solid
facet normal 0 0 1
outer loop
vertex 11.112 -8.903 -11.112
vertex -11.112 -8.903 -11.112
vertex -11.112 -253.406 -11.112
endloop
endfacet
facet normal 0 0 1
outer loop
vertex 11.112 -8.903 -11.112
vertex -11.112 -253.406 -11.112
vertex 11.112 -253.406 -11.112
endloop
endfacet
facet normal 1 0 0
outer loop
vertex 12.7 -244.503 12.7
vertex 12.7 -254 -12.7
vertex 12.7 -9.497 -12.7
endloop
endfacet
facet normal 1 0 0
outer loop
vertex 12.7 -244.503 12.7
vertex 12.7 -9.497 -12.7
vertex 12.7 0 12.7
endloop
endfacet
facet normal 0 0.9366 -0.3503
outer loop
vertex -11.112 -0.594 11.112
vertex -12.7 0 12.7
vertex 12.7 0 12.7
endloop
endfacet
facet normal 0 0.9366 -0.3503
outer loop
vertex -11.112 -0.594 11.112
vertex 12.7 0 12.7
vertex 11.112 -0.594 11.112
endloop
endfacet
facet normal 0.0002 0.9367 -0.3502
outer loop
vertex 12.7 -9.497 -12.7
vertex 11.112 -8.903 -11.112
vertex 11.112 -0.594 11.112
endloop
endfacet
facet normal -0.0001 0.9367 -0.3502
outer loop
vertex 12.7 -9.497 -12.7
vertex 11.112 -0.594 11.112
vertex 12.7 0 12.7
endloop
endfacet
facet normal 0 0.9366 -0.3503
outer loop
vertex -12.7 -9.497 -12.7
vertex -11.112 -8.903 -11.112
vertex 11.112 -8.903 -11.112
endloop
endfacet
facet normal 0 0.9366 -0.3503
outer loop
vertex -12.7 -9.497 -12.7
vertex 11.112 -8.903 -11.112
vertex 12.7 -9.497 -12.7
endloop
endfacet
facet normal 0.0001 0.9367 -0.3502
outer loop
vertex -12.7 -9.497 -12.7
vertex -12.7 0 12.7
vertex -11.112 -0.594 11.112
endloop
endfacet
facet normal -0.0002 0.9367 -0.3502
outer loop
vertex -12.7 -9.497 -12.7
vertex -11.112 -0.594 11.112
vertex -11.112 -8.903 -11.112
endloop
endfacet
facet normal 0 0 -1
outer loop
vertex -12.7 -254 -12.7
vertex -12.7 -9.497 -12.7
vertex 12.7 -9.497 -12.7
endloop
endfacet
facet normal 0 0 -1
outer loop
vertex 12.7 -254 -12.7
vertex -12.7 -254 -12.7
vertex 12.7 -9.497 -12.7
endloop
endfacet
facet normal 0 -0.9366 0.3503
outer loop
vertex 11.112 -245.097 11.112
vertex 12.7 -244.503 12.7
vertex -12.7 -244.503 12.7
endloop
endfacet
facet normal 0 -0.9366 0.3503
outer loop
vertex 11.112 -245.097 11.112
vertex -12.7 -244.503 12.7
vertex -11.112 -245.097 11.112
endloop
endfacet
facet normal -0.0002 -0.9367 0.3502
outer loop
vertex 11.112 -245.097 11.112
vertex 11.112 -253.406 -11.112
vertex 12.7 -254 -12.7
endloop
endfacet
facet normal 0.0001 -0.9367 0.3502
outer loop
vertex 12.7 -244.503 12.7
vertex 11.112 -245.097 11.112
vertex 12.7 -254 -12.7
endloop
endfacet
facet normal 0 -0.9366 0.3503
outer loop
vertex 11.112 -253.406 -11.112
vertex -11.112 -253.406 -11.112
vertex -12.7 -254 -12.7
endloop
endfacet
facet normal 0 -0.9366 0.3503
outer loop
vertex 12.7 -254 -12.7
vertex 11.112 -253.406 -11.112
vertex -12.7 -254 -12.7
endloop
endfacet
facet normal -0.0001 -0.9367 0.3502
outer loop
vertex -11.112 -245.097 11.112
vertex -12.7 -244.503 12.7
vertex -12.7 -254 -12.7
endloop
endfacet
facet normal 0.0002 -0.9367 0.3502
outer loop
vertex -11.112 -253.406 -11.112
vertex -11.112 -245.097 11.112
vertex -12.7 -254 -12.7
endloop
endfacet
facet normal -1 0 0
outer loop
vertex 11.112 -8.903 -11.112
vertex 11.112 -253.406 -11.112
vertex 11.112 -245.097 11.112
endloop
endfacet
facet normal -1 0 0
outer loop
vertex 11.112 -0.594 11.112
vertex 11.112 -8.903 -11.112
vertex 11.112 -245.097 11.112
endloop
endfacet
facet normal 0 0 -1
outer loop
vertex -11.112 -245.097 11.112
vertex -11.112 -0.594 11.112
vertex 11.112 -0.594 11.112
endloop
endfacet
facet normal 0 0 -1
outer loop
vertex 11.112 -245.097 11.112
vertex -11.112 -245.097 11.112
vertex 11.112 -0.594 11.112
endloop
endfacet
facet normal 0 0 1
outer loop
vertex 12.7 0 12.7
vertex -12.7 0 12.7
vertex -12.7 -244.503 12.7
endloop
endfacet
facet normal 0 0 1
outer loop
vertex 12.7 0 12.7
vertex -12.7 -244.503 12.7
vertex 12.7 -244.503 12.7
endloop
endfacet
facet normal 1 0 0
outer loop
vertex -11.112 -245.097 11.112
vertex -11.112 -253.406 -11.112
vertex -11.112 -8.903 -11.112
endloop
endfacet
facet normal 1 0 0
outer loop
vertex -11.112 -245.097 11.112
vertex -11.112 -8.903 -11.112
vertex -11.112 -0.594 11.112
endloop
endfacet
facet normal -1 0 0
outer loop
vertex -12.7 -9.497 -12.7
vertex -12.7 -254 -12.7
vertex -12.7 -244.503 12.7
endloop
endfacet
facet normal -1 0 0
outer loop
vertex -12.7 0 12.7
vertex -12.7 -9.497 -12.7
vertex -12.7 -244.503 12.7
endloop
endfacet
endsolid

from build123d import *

# Parameters (mm, degrees)
F0_W        = 25.4
F0_H        = 25.4
F0_W_2      = 22.225
F0_H_2      = 22.225
F1_DEPTH    = 254
F2_T1_DEPTH = 157.170304922
F3_T1_DEPTH = 157.170304922


# Not quite as in the source:
# - a fillet or chamfer that OpenCascade refuses, or shapes differently, is made with other operations: its cross-section is extruded or revolved along the edge and cut away or added


with BuildPart() as f1:
    # F0 (on Front) → F1 (new body)
    with BuildSketch(Plane.XZ):
        Rectangle(F0_W, F0_H)
        Rectangle(F0_W_2, F0_H_2, mode=Mode.SUBTRACT)
    extrude(amount=F1_DEPTH)

    # F2: chamfer of 25.4 x 9.4966708589 on 1 edges, made by hand

    # F2_s2 → F2_t1 (cut)
    with BuildSketch(Plane.YZ.offset(-78.585152461)):
        Polygon((-244.5033291411, 12.7), (-254, -12.7), (-254, 12.7), align=None)
    extrude(amount=F2_T1_DEPTH, mode=Mode.SUBTRACT)

    # F3: chamfer of 25.4 x 9.4966708589 on 1 edges, made by hand

    # F3_s2 → F3_t1 (cut)
    with BuildSketch(Plane.YZ.offset(-78.585152461)):
        Polygon((0, 12.7), (-9.4966708589, -12.7), (0, -12.7), align=None)
    extrude(amount=F3_T1_DEPTH, mode=Mode.SUBTRACT)


solid = f1.part
